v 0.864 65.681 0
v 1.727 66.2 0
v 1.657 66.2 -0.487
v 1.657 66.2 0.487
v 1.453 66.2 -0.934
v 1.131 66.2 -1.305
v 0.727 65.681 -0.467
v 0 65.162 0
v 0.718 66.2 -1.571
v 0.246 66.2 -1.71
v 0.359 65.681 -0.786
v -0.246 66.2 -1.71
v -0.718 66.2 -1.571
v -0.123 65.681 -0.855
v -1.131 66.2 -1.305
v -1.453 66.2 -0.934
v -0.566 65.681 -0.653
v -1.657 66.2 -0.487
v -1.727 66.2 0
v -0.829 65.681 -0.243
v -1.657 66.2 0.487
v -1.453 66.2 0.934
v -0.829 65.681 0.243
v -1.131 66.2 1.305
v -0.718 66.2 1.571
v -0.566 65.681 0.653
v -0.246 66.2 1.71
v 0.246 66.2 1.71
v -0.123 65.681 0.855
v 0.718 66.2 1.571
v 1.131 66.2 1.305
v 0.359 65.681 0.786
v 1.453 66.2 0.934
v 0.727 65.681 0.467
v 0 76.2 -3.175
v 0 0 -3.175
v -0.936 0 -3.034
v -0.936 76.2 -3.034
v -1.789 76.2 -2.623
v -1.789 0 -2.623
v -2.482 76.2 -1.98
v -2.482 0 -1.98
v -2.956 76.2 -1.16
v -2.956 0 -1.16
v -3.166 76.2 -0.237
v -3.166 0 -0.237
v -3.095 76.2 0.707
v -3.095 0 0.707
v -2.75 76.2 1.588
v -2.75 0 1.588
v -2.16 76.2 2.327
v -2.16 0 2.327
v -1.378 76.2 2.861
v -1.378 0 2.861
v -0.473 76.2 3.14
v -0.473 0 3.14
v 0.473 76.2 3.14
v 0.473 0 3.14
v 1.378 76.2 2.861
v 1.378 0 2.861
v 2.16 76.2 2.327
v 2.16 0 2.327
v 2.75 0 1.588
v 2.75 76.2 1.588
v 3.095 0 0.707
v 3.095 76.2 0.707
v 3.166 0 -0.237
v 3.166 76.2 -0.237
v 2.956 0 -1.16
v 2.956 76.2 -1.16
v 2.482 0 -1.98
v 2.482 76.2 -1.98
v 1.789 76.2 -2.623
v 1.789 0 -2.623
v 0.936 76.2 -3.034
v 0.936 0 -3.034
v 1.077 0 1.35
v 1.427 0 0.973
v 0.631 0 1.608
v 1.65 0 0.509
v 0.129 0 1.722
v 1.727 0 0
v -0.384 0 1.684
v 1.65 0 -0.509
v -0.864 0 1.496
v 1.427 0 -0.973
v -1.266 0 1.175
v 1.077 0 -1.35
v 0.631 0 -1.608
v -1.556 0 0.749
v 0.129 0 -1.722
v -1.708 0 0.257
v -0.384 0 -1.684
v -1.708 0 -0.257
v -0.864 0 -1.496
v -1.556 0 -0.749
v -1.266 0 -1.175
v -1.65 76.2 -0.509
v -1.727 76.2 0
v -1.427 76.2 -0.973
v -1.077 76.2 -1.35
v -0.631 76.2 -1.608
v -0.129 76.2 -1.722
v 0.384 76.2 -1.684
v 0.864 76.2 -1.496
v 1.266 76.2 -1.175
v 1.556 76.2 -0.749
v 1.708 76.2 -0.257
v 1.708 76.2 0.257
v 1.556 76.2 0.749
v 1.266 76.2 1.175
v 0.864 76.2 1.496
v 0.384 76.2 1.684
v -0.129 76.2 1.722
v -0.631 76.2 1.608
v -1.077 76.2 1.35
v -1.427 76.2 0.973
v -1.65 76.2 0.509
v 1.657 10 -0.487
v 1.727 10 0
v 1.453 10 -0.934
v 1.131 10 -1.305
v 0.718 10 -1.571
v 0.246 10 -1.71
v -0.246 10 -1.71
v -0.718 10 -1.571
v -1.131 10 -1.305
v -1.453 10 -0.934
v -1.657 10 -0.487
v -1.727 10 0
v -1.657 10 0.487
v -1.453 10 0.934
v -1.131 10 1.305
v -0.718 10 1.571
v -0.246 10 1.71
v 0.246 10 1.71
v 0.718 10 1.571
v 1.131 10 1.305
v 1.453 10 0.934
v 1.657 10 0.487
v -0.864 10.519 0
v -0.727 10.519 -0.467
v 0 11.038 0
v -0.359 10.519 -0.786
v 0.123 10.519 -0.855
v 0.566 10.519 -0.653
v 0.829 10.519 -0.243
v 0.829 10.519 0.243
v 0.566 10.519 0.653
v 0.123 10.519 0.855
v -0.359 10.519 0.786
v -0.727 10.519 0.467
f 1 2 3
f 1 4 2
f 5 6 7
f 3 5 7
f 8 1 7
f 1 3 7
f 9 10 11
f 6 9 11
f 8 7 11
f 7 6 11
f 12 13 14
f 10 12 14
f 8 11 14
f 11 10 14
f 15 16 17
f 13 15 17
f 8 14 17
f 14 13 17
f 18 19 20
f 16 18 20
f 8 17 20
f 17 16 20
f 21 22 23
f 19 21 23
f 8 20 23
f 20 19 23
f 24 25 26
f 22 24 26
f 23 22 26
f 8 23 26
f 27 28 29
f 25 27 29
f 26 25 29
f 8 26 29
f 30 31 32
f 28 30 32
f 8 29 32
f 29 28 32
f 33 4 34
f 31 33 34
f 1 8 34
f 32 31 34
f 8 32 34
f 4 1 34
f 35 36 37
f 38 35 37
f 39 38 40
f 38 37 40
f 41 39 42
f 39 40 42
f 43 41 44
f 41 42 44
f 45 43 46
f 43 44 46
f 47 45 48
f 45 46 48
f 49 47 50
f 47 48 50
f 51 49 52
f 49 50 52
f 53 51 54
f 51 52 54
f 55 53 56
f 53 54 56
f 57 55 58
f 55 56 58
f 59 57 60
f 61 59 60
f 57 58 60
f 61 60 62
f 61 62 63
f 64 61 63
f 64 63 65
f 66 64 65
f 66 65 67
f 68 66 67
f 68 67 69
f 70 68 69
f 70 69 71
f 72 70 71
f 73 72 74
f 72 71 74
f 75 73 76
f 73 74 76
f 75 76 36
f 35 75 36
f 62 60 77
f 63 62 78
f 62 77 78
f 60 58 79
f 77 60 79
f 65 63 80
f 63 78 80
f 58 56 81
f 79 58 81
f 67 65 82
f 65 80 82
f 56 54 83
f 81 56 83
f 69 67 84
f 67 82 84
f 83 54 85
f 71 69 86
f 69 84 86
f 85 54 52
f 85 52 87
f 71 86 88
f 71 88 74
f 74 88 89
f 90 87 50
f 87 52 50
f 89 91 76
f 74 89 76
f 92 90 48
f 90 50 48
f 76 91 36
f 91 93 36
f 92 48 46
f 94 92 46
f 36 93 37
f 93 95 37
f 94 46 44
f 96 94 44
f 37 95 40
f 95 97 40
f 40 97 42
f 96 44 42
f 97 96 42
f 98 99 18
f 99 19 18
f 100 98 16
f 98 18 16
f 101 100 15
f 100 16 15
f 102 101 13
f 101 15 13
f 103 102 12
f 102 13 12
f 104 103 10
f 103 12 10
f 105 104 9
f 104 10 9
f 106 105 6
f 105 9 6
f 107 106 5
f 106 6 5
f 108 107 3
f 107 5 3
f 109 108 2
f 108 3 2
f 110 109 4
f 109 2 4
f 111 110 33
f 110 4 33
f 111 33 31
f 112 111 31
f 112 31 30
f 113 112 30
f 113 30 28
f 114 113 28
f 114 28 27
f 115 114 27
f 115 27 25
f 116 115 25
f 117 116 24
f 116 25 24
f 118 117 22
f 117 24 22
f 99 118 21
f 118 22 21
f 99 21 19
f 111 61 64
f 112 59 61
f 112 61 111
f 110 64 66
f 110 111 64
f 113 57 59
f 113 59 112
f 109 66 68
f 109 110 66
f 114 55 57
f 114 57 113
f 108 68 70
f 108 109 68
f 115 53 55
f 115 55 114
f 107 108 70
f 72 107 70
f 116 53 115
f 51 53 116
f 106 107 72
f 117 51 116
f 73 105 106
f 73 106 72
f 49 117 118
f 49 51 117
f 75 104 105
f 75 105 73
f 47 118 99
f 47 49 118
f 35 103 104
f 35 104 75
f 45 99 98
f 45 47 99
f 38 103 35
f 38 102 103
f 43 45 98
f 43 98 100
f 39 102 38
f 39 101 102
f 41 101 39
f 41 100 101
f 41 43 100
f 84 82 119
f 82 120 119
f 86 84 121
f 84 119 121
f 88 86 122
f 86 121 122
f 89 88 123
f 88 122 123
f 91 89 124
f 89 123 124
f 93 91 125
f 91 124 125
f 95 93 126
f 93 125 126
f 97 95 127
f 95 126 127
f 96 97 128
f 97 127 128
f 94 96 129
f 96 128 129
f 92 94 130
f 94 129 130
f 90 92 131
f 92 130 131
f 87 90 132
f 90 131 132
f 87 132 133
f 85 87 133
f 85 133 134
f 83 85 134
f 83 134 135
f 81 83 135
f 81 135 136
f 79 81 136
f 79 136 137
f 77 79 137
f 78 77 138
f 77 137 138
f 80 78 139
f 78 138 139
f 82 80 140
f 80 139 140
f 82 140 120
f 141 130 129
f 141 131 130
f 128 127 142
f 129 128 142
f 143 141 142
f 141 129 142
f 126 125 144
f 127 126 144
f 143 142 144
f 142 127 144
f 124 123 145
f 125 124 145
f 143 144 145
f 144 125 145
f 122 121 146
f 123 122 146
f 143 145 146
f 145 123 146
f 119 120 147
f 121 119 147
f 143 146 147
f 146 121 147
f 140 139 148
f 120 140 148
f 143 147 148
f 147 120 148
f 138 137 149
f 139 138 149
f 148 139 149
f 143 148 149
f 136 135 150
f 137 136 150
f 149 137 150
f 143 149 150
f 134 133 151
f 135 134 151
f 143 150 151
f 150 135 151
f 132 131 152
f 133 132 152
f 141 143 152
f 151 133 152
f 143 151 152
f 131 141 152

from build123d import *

# Parameters (mm, degrees)
SKETCH1_R                 = 3.175
BOSS_EXTRUDE1_DEPTH       = 76.2
F_8_32_TAPPED_HOLE1_D     = 3.4544
F_8_32_TAPPED_HOLE1_DEPTH = 10
F_8_32_TAPPED_HOLE1_TIP   = 1.037806461
F_8_32_TAPPED_HOLE2_D     = 3.4544
F_8_32_TAPPED_HOLE2_DEPTH = 10
F_8_32_TAPPED_HOLE2_TIP   = 1.037806461


with BuildPart() as part:
    # Sketch1 → Boss-Extrude1 (new body)
    with BuildSketch(Plane(origin=(0, 0, 0), x_dir=(1, 0, 0), z_dir=(0, 1, 0))):
        with Locations(Location((0, 0, 0), (0, 0, 90))):
            Circle(SKETCH1_R)
    extrude(amount=BOSS_EXTRUDE1_DEPTH)

    # #8-32 Tapped Hole1
    with Locations(Plane(origin=(0, 76.2, 0), x_dir=(1, 0, 0), z_dir=(0, 1, 0))):
        with Locations((0, 0)):
            Hole(F_8_32_TAPPED_HOLE1_D / 2, depth=F_8_32_TAPPED_HOLE1_DEPTH)
            with Locations((0, 0, -(F_8_32_TAPPED_HOLE1_DEPTH + F_8_32_TAPPED_HOLE1_TIP / 2))):  # 118° drill point
                Cone(0, F_8_32_TAPPED_HOLE1_D / 2, F_8_32_TAPPED_HOLE1_TIP, mode=Mode.SUBTRACT)

    # #8-32 Tapped Hole2
    with Locations(Plane(origin=(0, 0, 0), x_dir=(-1, 0, 0), z_dir=(0, -1, 0))):
        with Locations((0, 0)):
            Hole(F_8_32_TAPPED_HOLE2_D / 2, depth=F_8_32_TAPPED_HOLE2_DEPTH)
            with Locations((0, 0, -(F_8_32_TAPPED_HOLE2_DEPTH + F_8_32_TAPPED_HOLE2_TIP / 2))):  # 118° drill point
                Cone(0, F_8_32_TAPPED_HOLE2_D / 2, F_8_32_TAPPED_HOLE2_TIP, mode=Mode.SUBTRACT)


solid = part.part
